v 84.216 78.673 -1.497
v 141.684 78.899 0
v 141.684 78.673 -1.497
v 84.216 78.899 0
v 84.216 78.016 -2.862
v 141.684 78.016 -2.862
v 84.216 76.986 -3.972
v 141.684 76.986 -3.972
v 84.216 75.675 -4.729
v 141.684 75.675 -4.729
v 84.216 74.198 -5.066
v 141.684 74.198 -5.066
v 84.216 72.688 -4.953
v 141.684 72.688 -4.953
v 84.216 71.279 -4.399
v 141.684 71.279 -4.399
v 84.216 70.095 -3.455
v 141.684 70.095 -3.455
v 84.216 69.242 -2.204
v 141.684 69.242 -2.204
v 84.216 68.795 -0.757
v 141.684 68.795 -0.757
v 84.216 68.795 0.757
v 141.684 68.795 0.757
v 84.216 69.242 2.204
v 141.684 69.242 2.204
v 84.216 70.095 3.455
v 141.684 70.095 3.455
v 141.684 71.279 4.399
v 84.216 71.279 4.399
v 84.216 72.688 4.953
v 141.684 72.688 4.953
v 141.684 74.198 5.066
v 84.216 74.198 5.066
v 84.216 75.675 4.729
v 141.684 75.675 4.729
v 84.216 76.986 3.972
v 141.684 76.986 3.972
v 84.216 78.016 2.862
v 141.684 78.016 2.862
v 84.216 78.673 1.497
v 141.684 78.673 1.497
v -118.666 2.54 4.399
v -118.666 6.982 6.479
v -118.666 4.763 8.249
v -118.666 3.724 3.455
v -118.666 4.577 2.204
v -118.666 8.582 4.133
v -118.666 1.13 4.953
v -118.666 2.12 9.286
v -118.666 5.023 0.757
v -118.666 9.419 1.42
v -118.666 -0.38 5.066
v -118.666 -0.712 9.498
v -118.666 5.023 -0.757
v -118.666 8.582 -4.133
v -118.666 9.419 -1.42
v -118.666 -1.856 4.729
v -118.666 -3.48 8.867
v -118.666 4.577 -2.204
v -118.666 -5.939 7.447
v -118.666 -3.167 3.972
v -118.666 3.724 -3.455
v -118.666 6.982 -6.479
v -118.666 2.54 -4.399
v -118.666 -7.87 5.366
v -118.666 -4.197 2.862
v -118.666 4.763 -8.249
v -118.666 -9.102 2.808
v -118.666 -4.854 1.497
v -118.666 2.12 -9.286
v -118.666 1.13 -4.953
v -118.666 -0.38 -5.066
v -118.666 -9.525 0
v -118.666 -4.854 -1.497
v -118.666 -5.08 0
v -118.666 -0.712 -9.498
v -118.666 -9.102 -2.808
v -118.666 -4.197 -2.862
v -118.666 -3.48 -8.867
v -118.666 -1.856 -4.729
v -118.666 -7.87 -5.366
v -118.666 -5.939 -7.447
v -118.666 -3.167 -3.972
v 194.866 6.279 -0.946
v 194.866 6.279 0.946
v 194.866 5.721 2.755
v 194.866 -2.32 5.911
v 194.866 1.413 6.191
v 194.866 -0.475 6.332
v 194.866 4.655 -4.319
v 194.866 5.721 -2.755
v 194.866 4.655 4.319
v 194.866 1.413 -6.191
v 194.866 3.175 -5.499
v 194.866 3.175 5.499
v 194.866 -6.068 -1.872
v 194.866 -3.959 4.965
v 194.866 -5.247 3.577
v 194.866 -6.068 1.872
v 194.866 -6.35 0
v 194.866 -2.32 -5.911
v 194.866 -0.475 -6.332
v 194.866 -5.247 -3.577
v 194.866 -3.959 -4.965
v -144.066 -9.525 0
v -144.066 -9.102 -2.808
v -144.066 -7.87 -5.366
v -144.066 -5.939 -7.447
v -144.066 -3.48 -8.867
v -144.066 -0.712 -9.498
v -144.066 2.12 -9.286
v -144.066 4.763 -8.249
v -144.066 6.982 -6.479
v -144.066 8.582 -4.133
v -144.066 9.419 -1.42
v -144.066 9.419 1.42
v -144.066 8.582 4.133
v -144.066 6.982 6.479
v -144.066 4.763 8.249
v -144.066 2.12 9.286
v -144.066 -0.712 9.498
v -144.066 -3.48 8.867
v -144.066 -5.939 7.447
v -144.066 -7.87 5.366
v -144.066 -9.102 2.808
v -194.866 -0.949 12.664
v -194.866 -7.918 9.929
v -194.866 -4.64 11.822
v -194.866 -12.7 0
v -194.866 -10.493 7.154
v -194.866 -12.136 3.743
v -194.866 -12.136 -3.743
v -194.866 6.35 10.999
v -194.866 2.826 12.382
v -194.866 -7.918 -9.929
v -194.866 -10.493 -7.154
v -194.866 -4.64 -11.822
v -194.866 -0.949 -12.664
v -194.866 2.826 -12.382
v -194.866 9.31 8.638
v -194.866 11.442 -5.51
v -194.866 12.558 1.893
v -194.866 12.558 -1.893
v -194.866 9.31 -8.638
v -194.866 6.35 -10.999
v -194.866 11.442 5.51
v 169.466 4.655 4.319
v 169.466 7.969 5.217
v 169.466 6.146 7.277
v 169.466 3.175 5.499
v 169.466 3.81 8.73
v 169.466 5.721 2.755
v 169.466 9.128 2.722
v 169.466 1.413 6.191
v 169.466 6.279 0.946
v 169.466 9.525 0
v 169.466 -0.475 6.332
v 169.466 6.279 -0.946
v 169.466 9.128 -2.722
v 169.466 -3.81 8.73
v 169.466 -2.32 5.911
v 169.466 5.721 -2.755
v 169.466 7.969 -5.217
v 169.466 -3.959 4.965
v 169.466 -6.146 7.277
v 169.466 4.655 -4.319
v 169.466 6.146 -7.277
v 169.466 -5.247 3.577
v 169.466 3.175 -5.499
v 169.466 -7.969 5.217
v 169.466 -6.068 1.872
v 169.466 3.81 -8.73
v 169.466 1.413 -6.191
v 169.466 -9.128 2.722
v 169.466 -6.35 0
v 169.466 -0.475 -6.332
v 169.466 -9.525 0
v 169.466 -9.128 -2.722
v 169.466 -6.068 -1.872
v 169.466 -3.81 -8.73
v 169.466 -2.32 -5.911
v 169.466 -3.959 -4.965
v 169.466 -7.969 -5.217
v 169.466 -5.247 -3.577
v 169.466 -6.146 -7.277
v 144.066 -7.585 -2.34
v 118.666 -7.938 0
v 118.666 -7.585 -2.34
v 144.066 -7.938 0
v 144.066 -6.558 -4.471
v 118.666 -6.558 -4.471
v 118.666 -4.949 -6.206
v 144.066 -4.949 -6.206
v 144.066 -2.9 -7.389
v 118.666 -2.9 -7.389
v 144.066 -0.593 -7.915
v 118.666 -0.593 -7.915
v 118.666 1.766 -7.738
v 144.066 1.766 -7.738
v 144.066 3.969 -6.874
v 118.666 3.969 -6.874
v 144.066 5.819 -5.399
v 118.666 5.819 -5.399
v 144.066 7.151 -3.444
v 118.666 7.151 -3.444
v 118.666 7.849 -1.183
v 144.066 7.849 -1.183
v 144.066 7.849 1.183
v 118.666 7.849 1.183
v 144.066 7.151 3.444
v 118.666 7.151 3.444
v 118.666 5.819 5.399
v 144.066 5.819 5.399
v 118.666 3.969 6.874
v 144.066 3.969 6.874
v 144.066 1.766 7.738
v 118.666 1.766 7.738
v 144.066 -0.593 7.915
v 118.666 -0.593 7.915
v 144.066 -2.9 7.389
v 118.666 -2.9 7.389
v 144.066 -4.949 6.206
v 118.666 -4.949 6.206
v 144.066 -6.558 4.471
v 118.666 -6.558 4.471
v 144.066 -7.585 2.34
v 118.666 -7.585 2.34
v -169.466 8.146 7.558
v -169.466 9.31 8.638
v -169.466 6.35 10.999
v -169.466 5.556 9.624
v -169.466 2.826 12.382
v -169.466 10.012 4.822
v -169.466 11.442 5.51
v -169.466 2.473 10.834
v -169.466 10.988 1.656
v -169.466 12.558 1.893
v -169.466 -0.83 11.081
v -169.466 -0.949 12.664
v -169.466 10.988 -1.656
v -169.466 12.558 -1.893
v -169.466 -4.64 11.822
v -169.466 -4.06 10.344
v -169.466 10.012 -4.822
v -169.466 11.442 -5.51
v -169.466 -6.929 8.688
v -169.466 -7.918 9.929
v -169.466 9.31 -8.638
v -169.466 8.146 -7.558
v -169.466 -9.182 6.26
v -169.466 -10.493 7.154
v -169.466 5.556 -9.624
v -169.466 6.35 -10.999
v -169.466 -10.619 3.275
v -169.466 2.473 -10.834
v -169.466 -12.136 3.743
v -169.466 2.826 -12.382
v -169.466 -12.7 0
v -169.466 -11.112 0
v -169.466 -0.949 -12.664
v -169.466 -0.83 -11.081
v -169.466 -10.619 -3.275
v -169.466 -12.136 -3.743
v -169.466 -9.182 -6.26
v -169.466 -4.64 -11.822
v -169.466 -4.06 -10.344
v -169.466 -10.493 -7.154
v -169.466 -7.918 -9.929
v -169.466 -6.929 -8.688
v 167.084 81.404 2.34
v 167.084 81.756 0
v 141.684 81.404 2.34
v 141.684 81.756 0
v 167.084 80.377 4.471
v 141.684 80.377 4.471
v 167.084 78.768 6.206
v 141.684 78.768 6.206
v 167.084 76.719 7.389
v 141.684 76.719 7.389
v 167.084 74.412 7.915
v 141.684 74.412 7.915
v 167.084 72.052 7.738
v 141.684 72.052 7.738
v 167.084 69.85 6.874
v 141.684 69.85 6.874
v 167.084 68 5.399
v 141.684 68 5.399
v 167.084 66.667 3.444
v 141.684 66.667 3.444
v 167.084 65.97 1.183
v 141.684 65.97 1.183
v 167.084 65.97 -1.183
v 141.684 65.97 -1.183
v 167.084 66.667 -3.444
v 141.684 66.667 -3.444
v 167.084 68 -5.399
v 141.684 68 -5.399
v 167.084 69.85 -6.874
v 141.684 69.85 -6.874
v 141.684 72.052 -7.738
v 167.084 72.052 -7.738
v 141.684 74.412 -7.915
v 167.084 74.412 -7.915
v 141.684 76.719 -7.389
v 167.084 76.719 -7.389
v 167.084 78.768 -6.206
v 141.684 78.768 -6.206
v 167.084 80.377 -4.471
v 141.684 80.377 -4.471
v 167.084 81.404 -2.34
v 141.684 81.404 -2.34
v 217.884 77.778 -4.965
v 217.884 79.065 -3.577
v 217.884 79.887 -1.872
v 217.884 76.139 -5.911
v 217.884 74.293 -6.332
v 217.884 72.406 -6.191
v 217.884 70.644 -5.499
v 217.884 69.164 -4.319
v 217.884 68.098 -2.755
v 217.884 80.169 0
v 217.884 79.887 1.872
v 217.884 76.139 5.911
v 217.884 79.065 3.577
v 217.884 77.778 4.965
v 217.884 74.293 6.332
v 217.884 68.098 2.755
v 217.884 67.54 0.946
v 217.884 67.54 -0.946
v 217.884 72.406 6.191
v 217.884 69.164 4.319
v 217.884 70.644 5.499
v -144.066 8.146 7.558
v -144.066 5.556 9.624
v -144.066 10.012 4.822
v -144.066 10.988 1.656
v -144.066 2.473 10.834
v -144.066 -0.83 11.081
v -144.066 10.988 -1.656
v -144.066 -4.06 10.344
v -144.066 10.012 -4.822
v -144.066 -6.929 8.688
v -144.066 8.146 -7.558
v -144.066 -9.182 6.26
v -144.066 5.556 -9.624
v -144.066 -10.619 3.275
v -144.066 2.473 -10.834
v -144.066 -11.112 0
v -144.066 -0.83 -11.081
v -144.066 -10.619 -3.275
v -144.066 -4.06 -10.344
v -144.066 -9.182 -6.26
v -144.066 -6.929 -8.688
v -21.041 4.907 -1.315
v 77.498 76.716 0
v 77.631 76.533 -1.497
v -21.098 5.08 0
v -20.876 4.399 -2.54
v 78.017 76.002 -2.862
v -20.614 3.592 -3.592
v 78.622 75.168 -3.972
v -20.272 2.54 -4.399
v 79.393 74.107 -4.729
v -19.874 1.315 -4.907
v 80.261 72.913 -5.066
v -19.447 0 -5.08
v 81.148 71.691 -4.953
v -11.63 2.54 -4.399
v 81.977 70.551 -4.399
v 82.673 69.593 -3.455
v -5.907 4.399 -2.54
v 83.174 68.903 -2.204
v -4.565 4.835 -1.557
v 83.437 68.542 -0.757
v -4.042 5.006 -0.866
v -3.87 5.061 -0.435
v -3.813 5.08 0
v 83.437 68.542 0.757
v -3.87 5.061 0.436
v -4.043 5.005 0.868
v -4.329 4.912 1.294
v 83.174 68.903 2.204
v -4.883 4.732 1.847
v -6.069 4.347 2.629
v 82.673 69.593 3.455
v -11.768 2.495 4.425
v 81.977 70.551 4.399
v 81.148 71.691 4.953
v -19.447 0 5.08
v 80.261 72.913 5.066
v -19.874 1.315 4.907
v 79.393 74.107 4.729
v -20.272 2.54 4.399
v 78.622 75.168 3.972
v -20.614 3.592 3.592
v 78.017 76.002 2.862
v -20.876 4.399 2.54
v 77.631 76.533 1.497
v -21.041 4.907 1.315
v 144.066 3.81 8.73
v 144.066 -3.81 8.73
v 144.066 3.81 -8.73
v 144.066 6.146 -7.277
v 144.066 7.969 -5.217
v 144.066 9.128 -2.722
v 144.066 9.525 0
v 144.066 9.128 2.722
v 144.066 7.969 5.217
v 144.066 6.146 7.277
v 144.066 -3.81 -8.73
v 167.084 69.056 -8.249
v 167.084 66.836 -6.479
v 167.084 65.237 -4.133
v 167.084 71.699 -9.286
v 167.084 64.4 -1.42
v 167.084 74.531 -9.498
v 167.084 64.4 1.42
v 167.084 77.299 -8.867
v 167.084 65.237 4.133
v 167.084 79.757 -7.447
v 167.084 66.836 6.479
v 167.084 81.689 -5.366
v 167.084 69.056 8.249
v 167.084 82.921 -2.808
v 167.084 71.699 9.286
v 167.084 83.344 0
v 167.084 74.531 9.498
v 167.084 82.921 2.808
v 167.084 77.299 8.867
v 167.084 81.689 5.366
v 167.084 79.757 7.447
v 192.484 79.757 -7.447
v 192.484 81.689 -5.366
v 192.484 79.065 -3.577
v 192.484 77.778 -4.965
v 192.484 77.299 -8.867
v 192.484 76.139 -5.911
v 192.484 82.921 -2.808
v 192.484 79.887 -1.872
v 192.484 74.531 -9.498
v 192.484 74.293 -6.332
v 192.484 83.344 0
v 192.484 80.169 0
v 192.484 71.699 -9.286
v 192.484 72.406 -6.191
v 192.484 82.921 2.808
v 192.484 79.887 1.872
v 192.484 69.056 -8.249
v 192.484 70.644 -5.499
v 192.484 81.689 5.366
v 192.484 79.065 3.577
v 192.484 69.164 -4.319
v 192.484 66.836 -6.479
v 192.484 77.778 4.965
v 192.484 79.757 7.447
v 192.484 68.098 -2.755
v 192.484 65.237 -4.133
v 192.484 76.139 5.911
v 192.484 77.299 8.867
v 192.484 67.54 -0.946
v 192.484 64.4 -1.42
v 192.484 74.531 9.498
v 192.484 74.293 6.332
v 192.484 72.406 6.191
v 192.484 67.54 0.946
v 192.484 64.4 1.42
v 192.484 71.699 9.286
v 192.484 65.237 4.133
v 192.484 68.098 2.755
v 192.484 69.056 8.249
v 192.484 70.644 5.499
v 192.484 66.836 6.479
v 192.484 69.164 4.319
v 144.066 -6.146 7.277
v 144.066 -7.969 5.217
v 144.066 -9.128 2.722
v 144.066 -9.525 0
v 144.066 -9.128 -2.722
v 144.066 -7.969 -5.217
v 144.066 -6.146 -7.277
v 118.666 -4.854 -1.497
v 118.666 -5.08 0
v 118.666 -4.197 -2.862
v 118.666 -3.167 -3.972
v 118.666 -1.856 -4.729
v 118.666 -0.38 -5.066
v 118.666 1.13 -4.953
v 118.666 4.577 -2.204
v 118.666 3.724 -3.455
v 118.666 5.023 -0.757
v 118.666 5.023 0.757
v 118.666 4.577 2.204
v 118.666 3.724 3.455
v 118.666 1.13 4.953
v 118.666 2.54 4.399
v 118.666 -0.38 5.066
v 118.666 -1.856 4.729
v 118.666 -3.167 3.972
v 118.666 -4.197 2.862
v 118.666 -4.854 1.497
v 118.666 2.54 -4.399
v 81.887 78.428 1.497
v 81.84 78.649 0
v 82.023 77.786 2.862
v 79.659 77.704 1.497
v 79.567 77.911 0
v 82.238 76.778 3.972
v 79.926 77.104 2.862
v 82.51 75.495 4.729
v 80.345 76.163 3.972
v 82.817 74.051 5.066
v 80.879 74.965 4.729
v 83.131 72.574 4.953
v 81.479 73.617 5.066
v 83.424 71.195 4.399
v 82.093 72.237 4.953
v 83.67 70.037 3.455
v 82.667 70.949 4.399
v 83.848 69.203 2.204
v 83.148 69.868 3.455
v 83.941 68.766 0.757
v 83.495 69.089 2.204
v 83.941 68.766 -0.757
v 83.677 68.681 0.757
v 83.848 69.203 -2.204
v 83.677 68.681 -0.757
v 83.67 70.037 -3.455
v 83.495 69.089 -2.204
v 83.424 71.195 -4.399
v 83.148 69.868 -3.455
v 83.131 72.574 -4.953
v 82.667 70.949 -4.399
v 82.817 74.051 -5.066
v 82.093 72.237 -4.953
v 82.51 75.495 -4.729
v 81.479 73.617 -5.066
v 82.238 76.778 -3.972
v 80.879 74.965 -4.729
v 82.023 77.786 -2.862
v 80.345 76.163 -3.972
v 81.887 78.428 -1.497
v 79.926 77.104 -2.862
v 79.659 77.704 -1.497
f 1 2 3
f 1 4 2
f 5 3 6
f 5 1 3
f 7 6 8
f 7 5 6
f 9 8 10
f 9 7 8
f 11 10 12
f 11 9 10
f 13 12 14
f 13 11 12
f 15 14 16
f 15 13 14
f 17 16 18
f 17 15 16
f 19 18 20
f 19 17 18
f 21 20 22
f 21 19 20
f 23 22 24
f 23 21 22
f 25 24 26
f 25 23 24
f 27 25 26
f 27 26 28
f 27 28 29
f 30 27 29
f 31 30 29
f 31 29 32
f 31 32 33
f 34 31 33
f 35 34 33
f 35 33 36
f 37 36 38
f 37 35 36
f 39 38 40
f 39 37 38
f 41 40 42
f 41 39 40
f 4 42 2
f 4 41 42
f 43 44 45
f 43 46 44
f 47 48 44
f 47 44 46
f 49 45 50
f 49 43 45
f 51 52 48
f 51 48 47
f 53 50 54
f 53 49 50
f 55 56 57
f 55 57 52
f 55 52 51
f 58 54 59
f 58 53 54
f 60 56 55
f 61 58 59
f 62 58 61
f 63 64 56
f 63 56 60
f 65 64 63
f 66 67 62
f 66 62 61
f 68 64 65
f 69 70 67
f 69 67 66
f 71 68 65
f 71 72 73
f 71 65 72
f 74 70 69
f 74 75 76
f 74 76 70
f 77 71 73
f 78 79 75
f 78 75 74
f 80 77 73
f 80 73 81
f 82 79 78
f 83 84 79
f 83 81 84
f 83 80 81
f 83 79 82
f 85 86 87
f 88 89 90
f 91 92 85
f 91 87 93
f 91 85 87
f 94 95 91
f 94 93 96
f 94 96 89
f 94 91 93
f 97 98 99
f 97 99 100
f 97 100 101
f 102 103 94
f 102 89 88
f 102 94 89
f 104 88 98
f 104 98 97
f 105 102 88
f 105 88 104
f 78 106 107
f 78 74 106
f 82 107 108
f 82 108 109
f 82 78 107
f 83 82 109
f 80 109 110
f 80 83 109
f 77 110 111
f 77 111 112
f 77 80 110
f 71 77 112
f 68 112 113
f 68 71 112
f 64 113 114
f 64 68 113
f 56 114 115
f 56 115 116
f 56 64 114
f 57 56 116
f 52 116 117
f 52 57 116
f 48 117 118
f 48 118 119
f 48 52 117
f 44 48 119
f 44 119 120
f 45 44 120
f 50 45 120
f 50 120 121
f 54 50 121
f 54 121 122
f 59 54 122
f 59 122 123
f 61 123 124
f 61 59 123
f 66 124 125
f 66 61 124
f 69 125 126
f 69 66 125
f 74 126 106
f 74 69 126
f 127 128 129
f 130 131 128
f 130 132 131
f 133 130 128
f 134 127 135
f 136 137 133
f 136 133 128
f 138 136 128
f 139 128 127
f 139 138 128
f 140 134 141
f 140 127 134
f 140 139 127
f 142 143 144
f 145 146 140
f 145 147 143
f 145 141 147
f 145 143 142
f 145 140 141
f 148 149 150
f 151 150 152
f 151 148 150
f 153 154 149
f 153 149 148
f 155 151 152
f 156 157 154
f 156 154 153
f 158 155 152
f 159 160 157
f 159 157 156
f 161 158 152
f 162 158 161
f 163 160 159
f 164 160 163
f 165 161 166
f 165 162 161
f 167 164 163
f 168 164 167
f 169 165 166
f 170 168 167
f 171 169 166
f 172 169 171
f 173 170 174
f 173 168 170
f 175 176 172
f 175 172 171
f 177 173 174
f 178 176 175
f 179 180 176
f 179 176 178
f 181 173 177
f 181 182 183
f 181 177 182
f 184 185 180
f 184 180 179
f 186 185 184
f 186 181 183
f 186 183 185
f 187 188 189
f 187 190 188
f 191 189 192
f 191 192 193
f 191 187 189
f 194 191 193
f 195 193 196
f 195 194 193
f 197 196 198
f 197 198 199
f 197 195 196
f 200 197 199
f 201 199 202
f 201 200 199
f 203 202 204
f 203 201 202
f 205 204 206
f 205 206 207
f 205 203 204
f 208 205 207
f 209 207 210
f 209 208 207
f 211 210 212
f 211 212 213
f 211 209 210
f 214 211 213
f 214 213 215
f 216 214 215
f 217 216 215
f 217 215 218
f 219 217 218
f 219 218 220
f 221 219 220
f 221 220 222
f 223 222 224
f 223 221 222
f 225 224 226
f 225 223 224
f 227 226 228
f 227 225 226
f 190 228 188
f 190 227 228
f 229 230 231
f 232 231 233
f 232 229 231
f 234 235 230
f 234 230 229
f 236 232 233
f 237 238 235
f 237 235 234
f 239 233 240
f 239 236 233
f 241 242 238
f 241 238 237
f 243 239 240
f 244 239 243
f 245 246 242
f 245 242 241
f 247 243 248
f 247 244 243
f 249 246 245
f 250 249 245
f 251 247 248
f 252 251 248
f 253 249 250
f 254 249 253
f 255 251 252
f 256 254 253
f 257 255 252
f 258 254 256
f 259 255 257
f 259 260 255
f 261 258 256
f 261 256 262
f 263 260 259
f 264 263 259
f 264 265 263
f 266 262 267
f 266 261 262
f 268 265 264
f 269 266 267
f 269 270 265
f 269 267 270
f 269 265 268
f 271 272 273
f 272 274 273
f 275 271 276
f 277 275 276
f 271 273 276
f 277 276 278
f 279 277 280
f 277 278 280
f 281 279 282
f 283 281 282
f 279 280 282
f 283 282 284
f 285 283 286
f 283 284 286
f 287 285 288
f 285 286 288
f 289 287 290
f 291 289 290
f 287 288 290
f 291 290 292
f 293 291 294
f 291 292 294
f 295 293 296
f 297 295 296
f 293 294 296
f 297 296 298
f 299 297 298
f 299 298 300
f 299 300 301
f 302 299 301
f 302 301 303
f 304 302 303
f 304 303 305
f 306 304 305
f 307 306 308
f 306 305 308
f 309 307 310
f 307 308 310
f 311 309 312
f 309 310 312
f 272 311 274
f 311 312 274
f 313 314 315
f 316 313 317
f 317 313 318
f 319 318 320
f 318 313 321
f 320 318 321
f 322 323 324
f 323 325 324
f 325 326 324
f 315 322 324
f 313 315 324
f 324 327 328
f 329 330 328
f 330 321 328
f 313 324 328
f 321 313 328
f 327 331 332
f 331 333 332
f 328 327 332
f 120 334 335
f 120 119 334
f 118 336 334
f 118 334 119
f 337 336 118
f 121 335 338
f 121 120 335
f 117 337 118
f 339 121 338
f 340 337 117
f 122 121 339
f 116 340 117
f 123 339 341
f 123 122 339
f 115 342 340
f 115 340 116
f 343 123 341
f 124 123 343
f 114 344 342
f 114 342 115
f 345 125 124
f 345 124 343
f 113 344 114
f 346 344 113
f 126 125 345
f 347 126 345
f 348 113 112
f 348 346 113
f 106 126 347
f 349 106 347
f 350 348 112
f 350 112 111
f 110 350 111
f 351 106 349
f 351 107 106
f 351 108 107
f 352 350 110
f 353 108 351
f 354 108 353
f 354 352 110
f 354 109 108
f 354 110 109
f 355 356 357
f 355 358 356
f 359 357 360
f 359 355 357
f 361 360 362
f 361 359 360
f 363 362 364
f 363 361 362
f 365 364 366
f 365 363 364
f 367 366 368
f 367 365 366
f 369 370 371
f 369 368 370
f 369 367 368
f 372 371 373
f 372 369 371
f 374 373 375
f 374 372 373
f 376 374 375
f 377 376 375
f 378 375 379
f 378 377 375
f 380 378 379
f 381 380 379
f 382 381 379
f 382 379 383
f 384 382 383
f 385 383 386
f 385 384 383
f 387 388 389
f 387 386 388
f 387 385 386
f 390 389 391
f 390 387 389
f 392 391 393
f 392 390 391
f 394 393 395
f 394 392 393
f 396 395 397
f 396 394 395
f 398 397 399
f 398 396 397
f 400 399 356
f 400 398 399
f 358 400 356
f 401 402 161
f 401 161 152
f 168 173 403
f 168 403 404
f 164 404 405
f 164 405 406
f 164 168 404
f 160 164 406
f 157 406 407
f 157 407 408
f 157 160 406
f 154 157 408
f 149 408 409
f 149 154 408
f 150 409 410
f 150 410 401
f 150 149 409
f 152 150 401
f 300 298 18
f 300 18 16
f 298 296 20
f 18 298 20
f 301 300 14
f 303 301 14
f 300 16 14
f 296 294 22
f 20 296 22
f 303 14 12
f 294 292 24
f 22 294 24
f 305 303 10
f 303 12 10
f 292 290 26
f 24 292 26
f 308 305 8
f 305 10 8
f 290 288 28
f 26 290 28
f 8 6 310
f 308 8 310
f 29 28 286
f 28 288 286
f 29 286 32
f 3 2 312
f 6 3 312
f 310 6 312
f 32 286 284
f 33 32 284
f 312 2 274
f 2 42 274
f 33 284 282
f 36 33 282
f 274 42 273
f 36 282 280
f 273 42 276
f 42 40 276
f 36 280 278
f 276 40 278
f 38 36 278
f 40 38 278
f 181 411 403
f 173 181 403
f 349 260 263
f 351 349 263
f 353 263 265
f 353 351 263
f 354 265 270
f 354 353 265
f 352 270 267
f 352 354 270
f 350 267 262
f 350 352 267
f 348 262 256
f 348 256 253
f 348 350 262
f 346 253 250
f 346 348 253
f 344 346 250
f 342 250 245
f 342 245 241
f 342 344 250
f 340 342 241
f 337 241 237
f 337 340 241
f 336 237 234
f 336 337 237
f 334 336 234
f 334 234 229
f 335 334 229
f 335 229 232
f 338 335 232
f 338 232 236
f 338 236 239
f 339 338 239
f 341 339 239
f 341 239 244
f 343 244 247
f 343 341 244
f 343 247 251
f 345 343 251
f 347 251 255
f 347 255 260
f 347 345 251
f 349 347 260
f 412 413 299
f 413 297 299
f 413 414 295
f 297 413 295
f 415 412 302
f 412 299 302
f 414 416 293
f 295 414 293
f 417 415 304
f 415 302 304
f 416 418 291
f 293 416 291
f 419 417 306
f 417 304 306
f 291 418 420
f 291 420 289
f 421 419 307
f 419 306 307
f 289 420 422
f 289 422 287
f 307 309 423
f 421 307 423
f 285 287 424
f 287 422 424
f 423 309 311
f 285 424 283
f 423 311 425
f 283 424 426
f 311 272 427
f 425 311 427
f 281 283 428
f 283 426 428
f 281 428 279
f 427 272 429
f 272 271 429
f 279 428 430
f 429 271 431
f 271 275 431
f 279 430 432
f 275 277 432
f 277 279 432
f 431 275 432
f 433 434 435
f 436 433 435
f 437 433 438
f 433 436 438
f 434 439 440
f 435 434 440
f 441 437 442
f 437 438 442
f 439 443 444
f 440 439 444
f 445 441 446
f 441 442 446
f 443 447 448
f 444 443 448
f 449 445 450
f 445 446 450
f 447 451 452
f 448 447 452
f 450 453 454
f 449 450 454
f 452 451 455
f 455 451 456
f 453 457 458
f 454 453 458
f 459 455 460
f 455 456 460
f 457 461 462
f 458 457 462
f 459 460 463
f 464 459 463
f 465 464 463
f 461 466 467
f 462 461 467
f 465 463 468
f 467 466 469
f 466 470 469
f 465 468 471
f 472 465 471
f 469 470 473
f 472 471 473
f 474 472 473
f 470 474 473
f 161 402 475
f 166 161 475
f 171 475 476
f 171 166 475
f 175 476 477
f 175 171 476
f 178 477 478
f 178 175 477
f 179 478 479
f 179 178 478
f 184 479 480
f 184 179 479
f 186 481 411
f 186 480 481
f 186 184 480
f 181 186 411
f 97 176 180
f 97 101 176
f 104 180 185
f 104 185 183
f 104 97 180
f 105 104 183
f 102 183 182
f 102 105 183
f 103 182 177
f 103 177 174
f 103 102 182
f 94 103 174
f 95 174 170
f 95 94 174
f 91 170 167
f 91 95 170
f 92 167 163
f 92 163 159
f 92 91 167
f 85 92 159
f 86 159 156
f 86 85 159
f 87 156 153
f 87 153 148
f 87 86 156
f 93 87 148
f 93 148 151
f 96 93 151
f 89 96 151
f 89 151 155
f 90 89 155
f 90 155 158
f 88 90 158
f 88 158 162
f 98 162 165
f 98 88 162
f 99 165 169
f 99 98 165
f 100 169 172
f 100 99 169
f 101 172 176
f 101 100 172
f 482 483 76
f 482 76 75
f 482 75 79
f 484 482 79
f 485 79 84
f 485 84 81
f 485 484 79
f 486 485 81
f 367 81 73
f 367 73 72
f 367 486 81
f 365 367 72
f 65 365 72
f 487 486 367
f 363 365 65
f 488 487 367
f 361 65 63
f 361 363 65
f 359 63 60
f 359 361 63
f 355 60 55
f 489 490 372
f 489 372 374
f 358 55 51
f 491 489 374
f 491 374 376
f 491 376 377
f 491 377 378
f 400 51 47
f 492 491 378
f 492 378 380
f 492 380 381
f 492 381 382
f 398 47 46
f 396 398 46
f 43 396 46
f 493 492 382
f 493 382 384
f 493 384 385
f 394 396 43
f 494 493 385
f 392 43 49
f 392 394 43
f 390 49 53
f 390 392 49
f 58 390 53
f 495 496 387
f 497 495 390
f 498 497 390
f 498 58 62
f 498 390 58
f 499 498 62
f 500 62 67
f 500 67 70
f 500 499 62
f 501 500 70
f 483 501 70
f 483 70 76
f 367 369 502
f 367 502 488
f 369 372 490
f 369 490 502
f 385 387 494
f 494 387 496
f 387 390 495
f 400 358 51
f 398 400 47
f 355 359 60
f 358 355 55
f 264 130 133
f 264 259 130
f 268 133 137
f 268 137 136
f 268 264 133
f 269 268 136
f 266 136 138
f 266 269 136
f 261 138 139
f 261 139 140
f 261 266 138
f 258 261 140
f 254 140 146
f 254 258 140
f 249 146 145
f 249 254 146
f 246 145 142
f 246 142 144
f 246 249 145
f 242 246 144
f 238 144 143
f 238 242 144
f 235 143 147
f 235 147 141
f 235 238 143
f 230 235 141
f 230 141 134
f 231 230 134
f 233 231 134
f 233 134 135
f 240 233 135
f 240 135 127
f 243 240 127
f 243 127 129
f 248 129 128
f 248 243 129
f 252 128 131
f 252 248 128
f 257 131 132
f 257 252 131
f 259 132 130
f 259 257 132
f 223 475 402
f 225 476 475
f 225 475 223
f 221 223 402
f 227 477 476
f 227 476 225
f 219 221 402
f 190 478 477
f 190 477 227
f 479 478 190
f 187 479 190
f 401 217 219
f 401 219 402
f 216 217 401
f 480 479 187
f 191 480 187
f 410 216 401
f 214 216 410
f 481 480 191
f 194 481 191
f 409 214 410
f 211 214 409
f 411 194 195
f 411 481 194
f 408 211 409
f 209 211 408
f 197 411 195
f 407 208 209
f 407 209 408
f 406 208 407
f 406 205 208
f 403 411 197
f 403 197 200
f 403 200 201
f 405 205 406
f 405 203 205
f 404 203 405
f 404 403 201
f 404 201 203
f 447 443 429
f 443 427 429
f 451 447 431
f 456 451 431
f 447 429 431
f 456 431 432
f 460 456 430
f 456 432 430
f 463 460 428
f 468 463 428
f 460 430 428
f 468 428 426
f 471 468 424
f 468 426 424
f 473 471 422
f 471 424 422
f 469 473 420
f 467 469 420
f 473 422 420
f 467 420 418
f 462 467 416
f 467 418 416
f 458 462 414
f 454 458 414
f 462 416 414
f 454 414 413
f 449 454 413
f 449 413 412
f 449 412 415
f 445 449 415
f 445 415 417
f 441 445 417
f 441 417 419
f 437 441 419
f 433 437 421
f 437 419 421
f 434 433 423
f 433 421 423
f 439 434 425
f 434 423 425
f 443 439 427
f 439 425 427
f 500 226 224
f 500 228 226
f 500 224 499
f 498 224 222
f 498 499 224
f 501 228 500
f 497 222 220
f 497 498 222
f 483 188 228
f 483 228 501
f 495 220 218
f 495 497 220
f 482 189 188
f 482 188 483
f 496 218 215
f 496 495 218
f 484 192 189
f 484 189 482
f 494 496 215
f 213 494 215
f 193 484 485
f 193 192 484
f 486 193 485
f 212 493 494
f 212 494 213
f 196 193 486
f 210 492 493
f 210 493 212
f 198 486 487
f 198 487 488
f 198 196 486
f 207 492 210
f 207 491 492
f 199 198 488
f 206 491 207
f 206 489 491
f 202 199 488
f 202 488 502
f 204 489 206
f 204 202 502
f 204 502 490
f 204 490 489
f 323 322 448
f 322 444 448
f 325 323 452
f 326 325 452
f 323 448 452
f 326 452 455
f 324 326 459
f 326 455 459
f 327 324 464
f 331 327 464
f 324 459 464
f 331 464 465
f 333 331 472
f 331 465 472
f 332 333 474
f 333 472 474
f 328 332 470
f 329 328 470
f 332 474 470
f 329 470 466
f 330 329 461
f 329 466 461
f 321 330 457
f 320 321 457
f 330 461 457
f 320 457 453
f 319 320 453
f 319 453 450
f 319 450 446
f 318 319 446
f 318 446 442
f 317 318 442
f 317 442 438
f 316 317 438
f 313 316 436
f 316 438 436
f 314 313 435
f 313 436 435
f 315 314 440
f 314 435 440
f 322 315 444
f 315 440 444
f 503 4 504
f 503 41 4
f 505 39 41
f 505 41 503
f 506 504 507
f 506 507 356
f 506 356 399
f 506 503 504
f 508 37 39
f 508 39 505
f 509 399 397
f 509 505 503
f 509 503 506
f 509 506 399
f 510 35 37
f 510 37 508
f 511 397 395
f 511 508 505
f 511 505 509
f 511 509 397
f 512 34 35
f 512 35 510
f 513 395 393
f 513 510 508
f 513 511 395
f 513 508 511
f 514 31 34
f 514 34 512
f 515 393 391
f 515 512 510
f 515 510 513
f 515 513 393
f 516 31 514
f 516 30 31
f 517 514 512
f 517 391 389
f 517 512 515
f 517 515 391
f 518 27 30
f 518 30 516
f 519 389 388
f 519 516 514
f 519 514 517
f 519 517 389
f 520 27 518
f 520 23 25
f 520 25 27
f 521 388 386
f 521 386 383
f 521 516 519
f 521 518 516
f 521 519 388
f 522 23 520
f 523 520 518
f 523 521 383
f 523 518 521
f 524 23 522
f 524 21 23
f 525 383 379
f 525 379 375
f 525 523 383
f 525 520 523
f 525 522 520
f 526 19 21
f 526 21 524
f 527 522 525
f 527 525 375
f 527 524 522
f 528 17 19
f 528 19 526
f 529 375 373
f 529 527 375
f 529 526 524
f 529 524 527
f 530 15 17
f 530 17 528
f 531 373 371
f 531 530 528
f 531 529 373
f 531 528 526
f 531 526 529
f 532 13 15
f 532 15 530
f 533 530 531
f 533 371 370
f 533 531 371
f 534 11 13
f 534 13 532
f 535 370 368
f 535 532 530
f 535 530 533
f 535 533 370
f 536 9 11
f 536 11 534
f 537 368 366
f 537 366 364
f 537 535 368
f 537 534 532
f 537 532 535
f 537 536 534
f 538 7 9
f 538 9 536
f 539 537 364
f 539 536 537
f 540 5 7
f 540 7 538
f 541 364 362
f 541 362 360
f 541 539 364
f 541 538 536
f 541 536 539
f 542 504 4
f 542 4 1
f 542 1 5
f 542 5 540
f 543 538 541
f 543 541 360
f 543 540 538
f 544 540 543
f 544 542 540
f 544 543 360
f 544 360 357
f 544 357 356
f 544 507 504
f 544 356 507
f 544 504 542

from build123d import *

# Parameters (mm, degrees)
F3_R     = 5.08
F7_W     = 7.62
F7_H     = 0.7951933011
F8_DEPTH = 217.885375


with BuildPart() as f1:
    # F0 (on Top) → F1 (revolve)
    with BuildSketch(Plane.XY):
        Polygon((-19.446875, 0), (-194.865625, 0), (-194.865625, -12.7), (-169.465625, -12.7), (-169.465625, -11.1125), (-144.065625, -11.1125), (-144.065625, -9.525), (-118.665625, -9.525), (-118.665625, -5.08), (118.665625, -5.08), (118.665625, -7.9375), (144.065625, -7.9375), (144.065625, -9.525), (169.465625, -9.525), (169.465625, -6.35), (194.865625, -6.35), (194.865625, 0), align=None)
    revolve(axis=Axis((7.8748166561, 0, 0), (1, 0, 0)))

    # F4: sweep along a path in F0
    with BuildLine(Plane.XY) as f4_path:
        Line((217.884375, 73.81875), (84.2164109554, 73.81875))
        ThreePointArc((84.2164109554, 73.81875), (82.2541135698, 73.5079460533), (80.4839074509, 72.6059591245))
        Line((80.4839074509, 72.6059591245), (-19.446875, 0))
    # F3 (on plane+point) → F4 (sweep)
    with BuildSketch(Plane.YZ.offset(217.884375)):
        with Locations((73.81875, 0)):
            Circle(F3_R)
    sweep(path=f4_path.line)

    # F5 (on Top) → F6 (revolve)
    with BuildSketch(Plane.XY):
        Polygon((141.684375, 73.81875), (217.884375, 73.81875), (217.884375, 80.16875), (192.484375, 80.16875), (192.484375, 83.34375), (167.084375, 83.34375), (167.084375, 81.75625), (141.684375, 81.75625), align=None)
    revolve(axis=Axis((213.4950719774, 73.81875, 0), (1, 0, 0)))

    # F7 (on Right) → F8 (cut, through all)
    with BuildSketch(Plane.YZ):
        with Locations((0, 9.1274033494)):
            Rectangle(F7_W, F7_H)
        with Locations((0, -9.1274033494)):
            Rectangle(F7_W, F7_H)
    extrude(amount=F8_DEPTH, mode=Mode.SUBTRACT)


solid = f1.part
